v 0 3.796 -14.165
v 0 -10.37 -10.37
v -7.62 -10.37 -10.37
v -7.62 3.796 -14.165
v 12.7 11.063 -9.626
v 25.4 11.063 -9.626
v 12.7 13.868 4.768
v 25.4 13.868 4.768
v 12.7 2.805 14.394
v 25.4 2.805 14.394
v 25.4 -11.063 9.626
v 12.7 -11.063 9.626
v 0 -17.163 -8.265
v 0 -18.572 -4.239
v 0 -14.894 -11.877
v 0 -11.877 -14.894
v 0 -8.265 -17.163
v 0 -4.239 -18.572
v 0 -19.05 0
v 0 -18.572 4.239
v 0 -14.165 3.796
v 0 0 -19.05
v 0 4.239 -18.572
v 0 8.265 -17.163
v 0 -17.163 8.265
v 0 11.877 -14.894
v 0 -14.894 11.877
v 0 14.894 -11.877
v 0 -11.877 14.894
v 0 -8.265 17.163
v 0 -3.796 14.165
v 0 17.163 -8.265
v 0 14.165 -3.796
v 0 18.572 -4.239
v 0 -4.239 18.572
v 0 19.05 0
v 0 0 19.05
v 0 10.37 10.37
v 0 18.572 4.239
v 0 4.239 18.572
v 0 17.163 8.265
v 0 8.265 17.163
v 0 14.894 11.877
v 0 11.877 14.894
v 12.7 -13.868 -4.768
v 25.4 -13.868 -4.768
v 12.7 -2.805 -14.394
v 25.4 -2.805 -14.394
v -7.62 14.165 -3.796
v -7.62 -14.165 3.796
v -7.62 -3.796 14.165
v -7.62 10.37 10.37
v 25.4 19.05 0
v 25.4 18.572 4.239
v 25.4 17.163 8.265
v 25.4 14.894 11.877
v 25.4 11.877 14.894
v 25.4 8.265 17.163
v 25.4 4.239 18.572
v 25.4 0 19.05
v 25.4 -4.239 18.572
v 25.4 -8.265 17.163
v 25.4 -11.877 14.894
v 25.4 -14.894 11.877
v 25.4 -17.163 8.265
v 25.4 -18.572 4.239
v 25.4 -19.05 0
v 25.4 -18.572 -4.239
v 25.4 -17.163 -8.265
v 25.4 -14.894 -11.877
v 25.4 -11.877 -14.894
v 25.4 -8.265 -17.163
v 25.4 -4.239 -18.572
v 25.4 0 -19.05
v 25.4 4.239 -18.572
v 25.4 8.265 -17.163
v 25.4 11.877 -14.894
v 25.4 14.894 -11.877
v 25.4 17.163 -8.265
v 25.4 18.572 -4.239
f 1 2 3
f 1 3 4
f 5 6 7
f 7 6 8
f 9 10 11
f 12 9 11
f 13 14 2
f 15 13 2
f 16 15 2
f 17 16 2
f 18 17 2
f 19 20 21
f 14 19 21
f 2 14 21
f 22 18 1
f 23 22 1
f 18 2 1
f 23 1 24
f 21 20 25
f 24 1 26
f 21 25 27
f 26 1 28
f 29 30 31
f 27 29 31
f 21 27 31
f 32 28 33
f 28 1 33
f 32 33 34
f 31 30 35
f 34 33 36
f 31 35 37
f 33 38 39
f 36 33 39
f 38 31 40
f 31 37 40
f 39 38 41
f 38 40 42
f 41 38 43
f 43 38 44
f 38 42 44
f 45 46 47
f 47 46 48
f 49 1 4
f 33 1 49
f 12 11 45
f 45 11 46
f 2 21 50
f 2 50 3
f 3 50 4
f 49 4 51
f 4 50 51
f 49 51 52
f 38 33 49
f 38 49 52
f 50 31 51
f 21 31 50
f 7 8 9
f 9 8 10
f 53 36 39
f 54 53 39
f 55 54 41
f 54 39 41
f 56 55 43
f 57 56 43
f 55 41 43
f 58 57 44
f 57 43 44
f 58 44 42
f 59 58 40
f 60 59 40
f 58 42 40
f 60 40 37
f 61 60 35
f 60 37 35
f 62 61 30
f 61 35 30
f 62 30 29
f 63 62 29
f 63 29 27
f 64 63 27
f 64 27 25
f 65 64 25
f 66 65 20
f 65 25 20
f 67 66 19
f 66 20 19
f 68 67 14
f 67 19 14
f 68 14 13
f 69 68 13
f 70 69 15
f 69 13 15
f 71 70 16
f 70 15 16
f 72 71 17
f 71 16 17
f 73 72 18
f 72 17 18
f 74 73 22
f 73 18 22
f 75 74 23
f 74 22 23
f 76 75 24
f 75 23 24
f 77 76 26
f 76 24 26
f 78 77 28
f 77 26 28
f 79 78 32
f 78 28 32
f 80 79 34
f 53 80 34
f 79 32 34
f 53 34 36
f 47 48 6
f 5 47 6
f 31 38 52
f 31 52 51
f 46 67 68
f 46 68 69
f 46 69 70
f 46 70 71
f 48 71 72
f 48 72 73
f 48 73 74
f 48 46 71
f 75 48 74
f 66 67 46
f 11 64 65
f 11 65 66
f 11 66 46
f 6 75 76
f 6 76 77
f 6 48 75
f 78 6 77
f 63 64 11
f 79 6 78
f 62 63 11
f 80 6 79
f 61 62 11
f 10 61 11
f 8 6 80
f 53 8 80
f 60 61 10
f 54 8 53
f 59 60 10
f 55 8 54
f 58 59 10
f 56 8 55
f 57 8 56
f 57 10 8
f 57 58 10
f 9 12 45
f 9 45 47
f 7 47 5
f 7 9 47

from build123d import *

# Parameters (mm, degrees)
F0_R     = 19.05
F1_DEPTH = 25.4
F3_DEPTH = 12.7
F5_DEPTH = 7.62


with BuildPart() as f1:
    # F0 (on Right) → F1 (new body)
    with BuildSketch(Plane.YZ):
        Circle(F0_R)
    extrude(amount=F1_DEPTH)

    # F2 (on face) + F0 (on Right) → F3 (cut)
    with BuildSketch(Plane.YZ.offset(25.4)):
        Polygon((13.868033, 4.767703), (2.805065, 14.39392), (-11.062968, 9.626218), (-13.868033, -4.767703), (-2.805065, -14.39392), (11.062968, -9.626218), align=None)
    with BuildSketch(Plane.YZ):
        Circle(F0_R)
    extrude(amount=-F3_DEPTH, mode=Mode.SUBTRACT)

    # F4 (on Right) → F5 (join)
    with BuildSketch(Plane.YZ):
        Polygon((3.795503, -14.165009), (14.165009, -3.795503), (10.369507, 10.369507), (-3.795503, 14.165009), (-14.165009, 3.795503), (-10.369507, -10.369507), align=None)
    extrude(amount=-F5_DEPTH)


solid = f1.part
